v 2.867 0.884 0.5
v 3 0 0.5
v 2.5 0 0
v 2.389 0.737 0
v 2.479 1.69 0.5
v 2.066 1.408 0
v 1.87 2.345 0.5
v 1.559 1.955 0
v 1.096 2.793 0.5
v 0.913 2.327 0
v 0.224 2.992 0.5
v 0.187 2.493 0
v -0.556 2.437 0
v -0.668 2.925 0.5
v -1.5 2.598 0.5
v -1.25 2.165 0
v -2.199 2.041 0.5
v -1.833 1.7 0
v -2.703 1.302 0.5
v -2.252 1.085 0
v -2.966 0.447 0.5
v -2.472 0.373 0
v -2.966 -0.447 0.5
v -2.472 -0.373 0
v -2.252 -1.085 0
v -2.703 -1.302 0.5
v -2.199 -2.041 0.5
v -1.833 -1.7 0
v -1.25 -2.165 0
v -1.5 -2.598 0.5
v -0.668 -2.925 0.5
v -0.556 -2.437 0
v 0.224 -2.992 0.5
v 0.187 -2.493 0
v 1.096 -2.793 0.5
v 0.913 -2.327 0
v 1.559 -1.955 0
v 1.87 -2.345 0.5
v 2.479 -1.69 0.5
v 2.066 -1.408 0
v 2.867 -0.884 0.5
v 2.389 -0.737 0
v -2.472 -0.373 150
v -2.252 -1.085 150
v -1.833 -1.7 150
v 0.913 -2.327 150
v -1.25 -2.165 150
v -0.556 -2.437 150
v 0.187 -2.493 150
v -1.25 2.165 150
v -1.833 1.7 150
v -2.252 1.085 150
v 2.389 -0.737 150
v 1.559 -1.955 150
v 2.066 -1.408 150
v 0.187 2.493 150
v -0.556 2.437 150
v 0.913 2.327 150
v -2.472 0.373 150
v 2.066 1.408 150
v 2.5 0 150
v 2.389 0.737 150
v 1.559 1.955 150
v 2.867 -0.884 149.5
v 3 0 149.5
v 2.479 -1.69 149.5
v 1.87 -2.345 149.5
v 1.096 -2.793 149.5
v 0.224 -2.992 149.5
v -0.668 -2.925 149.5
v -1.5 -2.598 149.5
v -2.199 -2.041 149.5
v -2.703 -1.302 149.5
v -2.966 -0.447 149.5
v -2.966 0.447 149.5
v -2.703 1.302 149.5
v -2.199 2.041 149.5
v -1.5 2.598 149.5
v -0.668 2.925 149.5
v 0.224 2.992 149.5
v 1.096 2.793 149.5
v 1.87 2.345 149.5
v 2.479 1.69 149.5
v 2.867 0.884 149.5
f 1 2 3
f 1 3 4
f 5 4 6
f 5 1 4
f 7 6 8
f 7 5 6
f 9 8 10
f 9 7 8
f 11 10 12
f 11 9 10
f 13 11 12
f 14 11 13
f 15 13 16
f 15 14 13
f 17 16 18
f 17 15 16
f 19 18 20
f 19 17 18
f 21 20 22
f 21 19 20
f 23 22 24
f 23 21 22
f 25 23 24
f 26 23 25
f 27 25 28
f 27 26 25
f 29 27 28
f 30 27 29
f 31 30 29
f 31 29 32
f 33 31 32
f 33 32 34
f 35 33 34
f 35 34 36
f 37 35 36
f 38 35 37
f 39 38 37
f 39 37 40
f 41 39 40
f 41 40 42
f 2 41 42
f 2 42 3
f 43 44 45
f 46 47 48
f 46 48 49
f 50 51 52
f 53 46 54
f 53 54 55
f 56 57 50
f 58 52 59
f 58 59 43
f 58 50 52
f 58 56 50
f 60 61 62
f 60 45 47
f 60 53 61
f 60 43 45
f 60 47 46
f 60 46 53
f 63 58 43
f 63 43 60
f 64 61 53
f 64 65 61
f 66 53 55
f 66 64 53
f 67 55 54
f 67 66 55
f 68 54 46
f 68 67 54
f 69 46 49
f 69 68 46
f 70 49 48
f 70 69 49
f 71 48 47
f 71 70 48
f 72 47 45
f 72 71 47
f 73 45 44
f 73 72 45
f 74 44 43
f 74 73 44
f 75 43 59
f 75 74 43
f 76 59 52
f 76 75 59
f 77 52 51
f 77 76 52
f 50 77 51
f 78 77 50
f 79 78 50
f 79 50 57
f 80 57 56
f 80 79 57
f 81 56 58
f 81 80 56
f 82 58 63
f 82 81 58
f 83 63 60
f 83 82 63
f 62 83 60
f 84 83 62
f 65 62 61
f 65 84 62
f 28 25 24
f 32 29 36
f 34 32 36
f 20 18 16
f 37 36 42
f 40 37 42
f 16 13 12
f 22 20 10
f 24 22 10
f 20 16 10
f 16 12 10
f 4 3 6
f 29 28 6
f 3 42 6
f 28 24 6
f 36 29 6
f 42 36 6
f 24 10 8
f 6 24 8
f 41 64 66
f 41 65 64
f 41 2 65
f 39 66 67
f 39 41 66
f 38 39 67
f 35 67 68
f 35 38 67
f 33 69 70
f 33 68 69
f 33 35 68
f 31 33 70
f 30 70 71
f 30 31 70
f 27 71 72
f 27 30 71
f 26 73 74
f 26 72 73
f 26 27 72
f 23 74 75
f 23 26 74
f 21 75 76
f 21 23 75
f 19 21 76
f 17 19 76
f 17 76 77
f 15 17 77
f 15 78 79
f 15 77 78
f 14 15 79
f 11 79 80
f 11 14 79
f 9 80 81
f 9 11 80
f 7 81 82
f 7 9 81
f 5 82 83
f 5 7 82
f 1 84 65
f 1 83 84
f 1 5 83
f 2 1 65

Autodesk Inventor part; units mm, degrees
ref_plane "YZ Plane" through (0, 0, 0) normal (1, 0, 0) x (0, 1, 0)
ref_plane "XZ Plane" through (0, 0, 0) normal (0, 1, 0) x (-1, 0, 0)
ref_plane "XY Plane" through (0, 0, 0) normal (0, 0, 1) x (1, 0, 0)
sketch "Sketch1" plane through (0, 0, 0) normal (0, 0, 1) x (1, 0, 0)
  circle A0 centre (0, 0) radius 3
  dimension "d0" = 6
extrude "Extrusion1" add sketch "Sketch1" along normal blind 150
chamfer "Chamfer1" distance 0.5 angle 45 1 edges at (-3, 0, 0)
chamfer "Chamfer2" distance 0.5 angle 45 1 edges at (-3, 0, 150)
properties part number "6mmx150mmSmoothRod"
